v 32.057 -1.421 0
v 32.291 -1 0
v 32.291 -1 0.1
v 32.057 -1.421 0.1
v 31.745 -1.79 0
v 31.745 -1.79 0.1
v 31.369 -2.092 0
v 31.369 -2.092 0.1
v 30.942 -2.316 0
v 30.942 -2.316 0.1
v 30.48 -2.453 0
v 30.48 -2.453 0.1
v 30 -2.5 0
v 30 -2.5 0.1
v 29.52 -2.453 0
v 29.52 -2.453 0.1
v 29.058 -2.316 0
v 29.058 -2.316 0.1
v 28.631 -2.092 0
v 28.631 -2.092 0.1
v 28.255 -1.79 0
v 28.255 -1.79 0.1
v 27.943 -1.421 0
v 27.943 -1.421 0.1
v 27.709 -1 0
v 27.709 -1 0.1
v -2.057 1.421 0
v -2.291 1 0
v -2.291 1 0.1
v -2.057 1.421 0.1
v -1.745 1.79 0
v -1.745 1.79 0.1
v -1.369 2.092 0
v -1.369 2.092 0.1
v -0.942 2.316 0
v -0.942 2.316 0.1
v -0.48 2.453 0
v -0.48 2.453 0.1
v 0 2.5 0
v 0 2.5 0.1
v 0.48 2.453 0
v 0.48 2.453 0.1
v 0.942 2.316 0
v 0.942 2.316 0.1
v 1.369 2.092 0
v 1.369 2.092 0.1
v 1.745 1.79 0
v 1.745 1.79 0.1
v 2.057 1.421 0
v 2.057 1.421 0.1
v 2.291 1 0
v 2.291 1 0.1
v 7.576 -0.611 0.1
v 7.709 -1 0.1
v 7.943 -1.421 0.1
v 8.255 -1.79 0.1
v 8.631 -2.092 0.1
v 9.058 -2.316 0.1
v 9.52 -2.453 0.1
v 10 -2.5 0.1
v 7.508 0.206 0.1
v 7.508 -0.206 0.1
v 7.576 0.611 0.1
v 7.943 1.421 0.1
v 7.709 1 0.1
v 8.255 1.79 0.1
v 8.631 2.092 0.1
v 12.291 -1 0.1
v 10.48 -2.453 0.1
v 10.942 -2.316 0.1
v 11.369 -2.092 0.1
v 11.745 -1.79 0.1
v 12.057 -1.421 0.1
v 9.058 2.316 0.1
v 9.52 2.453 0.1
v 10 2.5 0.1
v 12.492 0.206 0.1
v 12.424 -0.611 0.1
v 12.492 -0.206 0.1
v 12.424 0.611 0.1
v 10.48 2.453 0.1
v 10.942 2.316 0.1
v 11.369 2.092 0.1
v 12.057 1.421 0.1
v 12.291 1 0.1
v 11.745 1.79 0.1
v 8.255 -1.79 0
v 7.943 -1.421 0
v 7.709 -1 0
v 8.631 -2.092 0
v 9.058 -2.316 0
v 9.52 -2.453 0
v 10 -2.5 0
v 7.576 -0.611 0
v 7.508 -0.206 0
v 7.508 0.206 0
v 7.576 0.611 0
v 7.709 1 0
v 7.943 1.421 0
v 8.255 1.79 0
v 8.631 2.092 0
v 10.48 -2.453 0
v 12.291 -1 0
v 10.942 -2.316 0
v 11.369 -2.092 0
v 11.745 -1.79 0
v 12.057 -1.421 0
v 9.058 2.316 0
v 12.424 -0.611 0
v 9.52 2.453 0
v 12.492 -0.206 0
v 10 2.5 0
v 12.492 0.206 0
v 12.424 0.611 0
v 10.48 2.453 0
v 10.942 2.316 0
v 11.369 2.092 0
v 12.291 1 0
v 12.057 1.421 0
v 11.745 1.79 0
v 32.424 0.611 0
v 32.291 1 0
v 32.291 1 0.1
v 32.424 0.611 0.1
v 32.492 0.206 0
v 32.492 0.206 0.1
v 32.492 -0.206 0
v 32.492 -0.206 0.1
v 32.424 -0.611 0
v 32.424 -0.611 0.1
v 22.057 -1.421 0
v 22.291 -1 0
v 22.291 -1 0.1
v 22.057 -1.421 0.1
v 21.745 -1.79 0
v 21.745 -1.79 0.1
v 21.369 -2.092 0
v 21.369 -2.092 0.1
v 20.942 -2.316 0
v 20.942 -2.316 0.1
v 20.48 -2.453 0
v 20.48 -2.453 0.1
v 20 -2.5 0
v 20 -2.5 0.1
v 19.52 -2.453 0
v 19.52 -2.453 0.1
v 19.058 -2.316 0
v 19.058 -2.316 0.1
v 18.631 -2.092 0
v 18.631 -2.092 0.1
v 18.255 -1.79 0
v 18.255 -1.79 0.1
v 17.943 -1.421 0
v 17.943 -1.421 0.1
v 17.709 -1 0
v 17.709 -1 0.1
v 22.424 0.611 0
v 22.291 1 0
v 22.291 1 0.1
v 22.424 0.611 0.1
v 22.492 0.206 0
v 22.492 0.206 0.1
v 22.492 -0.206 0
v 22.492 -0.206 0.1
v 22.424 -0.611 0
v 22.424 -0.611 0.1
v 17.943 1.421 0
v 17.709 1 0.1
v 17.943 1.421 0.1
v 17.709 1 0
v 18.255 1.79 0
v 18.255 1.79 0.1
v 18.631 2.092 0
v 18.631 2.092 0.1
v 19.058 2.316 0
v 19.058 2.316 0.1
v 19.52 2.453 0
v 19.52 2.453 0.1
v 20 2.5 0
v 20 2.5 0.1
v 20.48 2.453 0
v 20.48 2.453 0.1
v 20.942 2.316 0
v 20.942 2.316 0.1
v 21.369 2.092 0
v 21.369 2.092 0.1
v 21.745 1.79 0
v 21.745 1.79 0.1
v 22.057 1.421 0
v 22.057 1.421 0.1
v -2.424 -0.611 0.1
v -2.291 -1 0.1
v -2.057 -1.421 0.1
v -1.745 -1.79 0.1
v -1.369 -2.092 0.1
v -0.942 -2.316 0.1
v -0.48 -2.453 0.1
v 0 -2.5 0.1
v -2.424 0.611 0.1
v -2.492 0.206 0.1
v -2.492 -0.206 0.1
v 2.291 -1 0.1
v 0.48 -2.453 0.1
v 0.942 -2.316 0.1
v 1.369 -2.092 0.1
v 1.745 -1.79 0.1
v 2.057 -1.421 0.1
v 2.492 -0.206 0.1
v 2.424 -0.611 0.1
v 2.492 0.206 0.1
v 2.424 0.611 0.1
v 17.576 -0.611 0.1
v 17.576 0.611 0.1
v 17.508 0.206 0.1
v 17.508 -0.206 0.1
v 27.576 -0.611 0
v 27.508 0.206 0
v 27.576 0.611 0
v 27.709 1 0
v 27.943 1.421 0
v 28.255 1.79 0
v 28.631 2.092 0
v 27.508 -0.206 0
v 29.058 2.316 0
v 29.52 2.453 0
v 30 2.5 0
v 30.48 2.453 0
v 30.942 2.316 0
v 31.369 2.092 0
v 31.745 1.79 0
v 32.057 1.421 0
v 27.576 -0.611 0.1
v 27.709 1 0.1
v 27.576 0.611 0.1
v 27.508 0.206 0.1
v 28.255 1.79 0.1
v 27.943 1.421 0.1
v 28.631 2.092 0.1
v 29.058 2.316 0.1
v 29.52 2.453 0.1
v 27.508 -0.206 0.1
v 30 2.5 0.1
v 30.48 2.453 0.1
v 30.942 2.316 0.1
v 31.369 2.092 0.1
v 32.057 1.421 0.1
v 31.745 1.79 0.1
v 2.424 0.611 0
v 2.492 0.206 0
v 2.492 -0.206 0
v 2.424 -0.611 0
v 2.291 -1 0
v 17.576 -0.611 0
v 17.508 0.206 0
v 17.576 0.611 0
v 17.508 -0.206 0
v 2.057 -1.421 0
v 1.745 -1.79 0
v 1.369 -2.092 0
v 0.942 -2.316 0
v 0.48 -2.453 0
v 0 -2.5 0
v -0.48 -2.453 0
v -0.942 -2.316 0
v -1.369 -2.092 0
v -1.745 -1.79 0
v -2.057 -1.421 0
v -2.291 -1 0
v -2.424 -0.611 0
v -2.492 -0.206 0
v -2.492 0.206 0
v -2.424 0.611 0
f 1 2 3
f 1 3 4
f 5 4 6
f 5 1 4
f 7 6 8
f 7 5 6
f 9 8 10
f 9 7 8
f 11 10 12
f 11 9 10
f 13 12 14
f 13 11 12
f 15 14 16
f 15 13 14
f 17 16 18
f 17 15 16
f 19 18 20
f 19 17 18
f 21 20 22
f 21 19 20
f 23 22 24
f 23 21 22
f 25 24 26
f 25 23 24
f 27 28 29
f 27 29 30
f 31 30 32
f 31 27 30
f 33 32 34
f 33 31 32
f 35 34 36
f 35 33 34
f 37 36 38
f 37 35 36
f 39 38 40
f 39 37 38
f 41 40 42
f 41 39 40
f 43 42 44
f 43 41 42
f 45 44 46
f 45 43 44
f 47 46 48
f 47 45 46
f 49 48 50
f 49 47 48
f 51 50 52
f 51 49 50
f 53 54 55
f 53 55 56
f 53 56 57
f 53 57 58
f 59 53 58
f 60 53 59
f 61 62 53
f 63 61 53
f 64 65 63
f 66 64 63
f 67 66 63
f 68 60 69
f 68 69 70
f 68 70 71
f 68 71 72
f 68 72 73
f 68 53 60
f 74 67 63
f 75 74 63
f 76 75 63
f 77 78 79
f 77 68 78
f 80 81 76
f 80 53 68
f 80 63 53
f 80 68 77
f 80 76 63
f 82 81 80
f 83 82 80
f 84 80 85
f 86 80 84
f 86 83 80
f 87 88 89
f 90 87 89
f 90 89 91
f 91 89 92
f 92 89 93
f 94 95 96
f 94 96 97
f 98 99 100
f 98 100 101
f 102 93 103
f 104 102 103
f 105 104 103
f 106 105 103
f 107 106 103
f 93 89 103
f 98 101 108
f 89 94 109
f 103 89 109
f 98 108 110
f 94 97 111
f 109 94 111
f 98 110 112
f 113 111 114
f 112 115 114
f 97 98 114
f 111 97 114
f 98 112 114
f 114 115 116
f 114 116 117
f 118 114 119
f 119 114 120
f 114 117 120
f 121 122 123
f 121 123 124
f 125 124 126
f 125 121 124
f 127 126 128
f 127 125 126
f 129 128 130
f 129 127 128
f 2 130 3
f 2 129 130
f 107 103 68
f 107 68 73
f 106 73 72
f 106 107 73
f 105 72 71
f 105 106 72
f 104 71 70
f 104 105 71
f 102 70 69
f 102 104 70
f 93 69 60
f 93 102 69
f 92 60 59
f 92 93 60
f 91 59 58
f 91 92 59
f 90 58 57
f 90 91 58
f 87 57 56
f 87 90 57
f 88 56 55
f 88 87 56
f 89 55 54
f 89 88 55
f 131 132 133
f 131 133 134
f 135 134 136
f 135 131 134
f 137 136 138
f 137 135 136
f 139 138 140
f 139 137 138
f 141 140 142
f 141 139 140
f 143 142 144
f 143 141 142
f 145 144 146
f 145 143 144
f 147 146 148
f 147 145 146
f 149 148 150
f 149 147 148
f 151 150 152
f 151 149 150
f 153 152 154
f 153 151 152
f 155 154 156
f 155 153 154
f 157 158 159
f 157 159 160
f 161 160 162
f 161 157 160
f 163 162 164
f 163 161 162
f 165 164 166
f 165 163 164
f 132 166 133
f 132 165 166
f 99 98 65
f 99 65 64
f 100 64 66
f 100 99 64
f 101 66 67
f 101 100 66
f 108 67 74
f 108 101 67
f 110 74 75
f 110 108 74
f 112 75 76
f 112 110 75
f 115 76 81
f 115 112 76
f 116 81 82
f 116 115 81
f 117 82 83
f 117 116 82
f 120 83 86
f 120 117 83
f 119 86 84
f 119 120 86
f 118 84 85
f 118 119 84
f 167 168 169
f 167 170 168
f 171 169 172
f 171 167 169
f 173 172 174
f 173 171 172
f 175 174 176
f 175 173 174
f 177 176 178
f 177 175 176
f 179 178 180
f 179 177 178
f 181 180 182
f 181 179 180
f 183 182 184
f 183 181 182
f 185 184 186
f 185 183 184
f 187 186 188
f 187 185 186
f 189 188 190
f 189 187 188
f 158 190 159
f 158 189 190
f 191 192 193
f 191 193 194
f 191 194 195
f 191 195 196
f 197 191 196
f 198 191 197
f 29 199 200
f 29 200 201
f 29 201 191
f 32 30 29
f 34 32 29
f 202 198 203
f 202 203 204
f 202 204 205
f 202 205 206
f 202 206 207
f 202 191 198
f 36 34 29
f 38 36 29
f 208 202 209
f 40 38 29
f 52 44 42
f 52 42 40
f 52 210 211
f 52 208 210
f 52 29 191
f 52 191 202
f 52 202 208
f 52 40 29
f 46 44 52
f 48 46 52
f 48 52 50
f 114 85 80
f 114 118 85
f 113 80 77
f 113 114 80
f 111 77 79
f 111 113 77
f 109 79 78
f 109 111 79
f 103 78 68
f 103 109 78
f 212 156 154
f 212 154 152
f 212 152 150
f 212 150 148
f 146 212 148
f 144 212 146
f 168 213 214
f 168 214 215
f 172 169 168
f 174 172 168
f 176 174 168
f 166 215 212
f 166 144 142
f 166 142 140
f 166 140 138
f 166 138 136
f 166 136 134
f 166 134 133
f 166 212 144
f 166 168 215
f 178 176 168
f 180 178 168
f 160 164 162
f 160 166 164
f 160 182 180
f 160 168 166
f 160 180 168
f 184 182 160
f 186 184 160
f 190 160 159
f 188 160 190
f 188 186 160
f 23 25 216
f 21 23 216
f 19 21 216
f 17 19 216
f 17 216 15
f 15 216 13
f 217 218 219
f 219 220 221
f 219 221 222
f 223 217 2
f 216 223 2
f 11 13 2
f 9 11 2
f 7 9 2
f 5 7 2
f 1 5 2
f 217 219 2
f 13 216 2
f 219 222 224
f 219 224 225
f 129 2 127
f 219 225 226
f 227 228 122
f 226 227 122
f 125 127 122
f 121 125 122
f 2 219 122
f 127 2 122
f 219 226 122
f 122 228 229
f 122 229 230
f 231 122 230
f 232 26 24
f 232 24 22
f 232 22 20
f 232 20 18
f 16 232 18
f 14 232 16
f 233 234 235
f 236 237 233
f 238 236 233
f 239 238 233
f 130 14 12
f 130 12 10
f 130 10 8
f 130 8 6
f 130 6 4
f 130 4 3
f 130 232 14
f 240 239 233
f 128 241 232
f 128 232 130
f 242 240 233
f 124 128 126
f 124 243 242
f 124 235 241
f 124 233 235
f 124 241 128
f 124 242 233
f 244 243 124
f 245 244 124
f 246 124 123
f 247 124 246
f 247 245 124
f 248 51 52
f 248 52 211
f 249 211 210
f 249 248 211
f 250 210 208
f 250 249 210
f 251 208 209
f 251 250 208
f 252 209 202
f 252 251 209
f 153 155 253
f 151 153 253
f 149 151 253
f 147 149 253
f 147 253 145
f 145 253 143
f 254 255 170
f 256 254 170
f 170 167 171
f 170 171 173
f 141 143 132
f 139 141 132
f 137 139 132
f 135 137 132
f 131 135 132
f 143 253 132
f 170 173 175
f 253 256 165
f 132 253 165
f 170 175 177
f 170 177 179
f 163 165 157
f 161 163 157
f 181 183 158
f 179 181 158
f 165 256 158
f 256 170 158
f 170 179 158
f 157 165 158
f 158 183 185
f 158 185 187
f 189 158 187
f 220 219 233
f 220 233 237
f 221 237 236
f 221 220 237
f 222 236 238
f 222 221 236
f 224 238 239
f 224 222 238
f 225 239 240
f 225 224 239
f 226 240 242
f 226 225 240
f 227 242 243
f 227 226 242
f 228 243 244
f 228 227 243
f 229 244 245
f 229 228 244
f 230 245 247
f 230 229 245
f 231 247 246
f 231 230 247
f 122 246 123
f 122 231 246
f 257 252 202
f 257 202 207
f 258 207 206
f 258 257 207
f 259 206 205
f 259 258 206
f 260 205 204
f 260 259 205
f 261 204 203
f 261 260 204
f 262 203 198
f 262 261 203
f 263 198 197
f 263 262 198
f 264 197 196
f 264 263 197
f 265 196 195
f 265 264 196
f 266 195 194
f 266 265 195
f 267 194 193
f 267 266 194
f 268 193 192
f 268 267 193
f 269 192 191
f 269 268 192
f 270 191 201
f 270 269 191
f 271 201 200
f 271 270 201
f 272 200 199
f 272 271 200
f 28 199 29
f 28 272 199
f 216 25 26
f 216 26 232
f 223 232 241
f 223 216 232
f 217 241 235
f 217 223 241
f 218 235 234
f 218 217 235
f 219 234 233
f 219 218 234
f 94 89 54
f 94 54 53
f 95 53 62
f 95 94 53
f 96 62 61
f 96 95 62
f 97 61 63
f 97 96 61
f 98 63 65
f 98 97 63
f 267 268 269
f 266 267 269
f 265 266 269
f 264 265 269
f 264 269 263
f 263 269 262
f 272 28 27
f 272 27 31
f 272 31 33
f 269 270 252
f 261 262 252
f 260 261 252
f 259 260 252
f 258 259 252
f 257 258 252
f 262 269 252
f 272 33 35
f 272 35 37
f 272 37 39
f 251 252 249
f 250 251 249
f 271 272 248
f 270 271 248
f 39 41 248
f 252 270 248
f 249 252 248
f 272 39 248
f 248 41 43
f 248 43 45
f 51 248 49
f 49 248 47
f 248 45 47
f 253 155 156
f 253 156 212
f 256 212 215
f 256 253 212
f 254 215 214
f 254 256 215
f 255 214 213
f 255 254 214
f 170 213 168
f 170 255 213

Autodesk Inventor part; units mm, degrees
ref_plane "YZ Plane" through (0, 0, 0) normal (1, 0, 0) x (0, 1, 0)
ref_plane "XZ Plane" through (0, 0, 0) normal (0, 1, 0) x (-1, 0, 0)
ref_plane "XY Plane" through (0, 0, 0) normal (0, 0, 1) x (1, 0, 0)
sketch "Sketch1" plane through (0, 0, 0) normal (0, 0, 1) x (1, 0, 0)
  arc A0 (32.2913, 1) -> (27.7087, 1) centre (30, 0) ccw
  line L0 (32.2913, 1) -> (37.5, 1)
  line L1 (37.5, 1) -> (37.5, -1)
  line L2 (37.5, -1) -> (32.2913, -1)
  arc A1 (27.7087, -1) -> (32.2913, -1) centre (30, 0) ccw
  line L3 (27.7087, -1) -> (22.2913, -1)
  arc A2 (17.7087, -1) -> (22.2913, -1) centre (20, 0) ccw
  line L4 (17.7087, -1) -> (12.2913, -1)
  arc A3 (7.7087, -1) -> (12.2913, -1) centre (10, 0) ccw
  line L5 (7.7087, -1) -> (2.2913, -1)
  arc A4 (-2.2913, -1) -> (2.2913, -1) centre (0, 0) ccw
  line L6 (-2.2913, -1) -> (-7.5, -1)
  line L7 (-7.5, -1) -> (-7.5, 1)
  line L8 (-7.5, 1) -> (-2.2913, 1)
  arc A5 (2.2913, 1) -> (-2.2913, 1) centre (0, 0) ccw
  line L9 (2.2913, 1) -> (7.7087, 1)
  arc A6 (12.2913, 1) -> (7.7087, 1) centre (10, 0) ccw
  line L10 (12.2913, 1) -> (17.7087, 1)
  arc A7 (22.2913, 1) -> (17.7087, 1) centre (20, 0) ccw
  line L11 (22.2913, 1) -> (27.7087, 1)
  circle A8 centre (30, 0) radius 2
  circle A9 centre (10, 0) radius 2
  circle A10 centre (0, 0) radius 2
  circle A11 centre (20, 0) radius 2
  circle A12 centre (0, 0) radius 2.5
  circle A13 centre (10, 0) radius 2.5
  circle A14 centre (20, 0) radius 2.5
  circle A15 centre (30, 0) radius 2.5
  point P0 (32.2913, 1)
  point P1 (27.7087, -1)
  point P2 (27.7087, 1)
  point P3 (22.2913, 1)
  point P4 (17.7087, -1)
  point P5 (12.2913, 1)
  point P6 (7.7087, 1)
  point P7 (7.7087, 1)
  point P8 (12.2913, 1)
  point P9 (17.7087, -1)
  point P10 (22.2913, 1)
  point P11 (27.7087, 1)
  point P12 (27.7087, -1)
  point P13 (32.2913, 1)
extrude "Extrusion2" add sketch "Sketch1" along normal blind 0.1 contours A12 A4 A5 | A10
extrude "Extrusion3" add sketch "Sketch1" along normal blind 0.1 contours A13 A3 A6 | A9
extrude "Extrusion4" add sketch "Sketch1" along normal blind 0.1 contours A14 A2 A7 | A11
extrude "Extrusion5" add sketch "Sketch1" along normal blind 0.1 contours A15 A1 A0 | A8
properties part number "LED_colorer"
